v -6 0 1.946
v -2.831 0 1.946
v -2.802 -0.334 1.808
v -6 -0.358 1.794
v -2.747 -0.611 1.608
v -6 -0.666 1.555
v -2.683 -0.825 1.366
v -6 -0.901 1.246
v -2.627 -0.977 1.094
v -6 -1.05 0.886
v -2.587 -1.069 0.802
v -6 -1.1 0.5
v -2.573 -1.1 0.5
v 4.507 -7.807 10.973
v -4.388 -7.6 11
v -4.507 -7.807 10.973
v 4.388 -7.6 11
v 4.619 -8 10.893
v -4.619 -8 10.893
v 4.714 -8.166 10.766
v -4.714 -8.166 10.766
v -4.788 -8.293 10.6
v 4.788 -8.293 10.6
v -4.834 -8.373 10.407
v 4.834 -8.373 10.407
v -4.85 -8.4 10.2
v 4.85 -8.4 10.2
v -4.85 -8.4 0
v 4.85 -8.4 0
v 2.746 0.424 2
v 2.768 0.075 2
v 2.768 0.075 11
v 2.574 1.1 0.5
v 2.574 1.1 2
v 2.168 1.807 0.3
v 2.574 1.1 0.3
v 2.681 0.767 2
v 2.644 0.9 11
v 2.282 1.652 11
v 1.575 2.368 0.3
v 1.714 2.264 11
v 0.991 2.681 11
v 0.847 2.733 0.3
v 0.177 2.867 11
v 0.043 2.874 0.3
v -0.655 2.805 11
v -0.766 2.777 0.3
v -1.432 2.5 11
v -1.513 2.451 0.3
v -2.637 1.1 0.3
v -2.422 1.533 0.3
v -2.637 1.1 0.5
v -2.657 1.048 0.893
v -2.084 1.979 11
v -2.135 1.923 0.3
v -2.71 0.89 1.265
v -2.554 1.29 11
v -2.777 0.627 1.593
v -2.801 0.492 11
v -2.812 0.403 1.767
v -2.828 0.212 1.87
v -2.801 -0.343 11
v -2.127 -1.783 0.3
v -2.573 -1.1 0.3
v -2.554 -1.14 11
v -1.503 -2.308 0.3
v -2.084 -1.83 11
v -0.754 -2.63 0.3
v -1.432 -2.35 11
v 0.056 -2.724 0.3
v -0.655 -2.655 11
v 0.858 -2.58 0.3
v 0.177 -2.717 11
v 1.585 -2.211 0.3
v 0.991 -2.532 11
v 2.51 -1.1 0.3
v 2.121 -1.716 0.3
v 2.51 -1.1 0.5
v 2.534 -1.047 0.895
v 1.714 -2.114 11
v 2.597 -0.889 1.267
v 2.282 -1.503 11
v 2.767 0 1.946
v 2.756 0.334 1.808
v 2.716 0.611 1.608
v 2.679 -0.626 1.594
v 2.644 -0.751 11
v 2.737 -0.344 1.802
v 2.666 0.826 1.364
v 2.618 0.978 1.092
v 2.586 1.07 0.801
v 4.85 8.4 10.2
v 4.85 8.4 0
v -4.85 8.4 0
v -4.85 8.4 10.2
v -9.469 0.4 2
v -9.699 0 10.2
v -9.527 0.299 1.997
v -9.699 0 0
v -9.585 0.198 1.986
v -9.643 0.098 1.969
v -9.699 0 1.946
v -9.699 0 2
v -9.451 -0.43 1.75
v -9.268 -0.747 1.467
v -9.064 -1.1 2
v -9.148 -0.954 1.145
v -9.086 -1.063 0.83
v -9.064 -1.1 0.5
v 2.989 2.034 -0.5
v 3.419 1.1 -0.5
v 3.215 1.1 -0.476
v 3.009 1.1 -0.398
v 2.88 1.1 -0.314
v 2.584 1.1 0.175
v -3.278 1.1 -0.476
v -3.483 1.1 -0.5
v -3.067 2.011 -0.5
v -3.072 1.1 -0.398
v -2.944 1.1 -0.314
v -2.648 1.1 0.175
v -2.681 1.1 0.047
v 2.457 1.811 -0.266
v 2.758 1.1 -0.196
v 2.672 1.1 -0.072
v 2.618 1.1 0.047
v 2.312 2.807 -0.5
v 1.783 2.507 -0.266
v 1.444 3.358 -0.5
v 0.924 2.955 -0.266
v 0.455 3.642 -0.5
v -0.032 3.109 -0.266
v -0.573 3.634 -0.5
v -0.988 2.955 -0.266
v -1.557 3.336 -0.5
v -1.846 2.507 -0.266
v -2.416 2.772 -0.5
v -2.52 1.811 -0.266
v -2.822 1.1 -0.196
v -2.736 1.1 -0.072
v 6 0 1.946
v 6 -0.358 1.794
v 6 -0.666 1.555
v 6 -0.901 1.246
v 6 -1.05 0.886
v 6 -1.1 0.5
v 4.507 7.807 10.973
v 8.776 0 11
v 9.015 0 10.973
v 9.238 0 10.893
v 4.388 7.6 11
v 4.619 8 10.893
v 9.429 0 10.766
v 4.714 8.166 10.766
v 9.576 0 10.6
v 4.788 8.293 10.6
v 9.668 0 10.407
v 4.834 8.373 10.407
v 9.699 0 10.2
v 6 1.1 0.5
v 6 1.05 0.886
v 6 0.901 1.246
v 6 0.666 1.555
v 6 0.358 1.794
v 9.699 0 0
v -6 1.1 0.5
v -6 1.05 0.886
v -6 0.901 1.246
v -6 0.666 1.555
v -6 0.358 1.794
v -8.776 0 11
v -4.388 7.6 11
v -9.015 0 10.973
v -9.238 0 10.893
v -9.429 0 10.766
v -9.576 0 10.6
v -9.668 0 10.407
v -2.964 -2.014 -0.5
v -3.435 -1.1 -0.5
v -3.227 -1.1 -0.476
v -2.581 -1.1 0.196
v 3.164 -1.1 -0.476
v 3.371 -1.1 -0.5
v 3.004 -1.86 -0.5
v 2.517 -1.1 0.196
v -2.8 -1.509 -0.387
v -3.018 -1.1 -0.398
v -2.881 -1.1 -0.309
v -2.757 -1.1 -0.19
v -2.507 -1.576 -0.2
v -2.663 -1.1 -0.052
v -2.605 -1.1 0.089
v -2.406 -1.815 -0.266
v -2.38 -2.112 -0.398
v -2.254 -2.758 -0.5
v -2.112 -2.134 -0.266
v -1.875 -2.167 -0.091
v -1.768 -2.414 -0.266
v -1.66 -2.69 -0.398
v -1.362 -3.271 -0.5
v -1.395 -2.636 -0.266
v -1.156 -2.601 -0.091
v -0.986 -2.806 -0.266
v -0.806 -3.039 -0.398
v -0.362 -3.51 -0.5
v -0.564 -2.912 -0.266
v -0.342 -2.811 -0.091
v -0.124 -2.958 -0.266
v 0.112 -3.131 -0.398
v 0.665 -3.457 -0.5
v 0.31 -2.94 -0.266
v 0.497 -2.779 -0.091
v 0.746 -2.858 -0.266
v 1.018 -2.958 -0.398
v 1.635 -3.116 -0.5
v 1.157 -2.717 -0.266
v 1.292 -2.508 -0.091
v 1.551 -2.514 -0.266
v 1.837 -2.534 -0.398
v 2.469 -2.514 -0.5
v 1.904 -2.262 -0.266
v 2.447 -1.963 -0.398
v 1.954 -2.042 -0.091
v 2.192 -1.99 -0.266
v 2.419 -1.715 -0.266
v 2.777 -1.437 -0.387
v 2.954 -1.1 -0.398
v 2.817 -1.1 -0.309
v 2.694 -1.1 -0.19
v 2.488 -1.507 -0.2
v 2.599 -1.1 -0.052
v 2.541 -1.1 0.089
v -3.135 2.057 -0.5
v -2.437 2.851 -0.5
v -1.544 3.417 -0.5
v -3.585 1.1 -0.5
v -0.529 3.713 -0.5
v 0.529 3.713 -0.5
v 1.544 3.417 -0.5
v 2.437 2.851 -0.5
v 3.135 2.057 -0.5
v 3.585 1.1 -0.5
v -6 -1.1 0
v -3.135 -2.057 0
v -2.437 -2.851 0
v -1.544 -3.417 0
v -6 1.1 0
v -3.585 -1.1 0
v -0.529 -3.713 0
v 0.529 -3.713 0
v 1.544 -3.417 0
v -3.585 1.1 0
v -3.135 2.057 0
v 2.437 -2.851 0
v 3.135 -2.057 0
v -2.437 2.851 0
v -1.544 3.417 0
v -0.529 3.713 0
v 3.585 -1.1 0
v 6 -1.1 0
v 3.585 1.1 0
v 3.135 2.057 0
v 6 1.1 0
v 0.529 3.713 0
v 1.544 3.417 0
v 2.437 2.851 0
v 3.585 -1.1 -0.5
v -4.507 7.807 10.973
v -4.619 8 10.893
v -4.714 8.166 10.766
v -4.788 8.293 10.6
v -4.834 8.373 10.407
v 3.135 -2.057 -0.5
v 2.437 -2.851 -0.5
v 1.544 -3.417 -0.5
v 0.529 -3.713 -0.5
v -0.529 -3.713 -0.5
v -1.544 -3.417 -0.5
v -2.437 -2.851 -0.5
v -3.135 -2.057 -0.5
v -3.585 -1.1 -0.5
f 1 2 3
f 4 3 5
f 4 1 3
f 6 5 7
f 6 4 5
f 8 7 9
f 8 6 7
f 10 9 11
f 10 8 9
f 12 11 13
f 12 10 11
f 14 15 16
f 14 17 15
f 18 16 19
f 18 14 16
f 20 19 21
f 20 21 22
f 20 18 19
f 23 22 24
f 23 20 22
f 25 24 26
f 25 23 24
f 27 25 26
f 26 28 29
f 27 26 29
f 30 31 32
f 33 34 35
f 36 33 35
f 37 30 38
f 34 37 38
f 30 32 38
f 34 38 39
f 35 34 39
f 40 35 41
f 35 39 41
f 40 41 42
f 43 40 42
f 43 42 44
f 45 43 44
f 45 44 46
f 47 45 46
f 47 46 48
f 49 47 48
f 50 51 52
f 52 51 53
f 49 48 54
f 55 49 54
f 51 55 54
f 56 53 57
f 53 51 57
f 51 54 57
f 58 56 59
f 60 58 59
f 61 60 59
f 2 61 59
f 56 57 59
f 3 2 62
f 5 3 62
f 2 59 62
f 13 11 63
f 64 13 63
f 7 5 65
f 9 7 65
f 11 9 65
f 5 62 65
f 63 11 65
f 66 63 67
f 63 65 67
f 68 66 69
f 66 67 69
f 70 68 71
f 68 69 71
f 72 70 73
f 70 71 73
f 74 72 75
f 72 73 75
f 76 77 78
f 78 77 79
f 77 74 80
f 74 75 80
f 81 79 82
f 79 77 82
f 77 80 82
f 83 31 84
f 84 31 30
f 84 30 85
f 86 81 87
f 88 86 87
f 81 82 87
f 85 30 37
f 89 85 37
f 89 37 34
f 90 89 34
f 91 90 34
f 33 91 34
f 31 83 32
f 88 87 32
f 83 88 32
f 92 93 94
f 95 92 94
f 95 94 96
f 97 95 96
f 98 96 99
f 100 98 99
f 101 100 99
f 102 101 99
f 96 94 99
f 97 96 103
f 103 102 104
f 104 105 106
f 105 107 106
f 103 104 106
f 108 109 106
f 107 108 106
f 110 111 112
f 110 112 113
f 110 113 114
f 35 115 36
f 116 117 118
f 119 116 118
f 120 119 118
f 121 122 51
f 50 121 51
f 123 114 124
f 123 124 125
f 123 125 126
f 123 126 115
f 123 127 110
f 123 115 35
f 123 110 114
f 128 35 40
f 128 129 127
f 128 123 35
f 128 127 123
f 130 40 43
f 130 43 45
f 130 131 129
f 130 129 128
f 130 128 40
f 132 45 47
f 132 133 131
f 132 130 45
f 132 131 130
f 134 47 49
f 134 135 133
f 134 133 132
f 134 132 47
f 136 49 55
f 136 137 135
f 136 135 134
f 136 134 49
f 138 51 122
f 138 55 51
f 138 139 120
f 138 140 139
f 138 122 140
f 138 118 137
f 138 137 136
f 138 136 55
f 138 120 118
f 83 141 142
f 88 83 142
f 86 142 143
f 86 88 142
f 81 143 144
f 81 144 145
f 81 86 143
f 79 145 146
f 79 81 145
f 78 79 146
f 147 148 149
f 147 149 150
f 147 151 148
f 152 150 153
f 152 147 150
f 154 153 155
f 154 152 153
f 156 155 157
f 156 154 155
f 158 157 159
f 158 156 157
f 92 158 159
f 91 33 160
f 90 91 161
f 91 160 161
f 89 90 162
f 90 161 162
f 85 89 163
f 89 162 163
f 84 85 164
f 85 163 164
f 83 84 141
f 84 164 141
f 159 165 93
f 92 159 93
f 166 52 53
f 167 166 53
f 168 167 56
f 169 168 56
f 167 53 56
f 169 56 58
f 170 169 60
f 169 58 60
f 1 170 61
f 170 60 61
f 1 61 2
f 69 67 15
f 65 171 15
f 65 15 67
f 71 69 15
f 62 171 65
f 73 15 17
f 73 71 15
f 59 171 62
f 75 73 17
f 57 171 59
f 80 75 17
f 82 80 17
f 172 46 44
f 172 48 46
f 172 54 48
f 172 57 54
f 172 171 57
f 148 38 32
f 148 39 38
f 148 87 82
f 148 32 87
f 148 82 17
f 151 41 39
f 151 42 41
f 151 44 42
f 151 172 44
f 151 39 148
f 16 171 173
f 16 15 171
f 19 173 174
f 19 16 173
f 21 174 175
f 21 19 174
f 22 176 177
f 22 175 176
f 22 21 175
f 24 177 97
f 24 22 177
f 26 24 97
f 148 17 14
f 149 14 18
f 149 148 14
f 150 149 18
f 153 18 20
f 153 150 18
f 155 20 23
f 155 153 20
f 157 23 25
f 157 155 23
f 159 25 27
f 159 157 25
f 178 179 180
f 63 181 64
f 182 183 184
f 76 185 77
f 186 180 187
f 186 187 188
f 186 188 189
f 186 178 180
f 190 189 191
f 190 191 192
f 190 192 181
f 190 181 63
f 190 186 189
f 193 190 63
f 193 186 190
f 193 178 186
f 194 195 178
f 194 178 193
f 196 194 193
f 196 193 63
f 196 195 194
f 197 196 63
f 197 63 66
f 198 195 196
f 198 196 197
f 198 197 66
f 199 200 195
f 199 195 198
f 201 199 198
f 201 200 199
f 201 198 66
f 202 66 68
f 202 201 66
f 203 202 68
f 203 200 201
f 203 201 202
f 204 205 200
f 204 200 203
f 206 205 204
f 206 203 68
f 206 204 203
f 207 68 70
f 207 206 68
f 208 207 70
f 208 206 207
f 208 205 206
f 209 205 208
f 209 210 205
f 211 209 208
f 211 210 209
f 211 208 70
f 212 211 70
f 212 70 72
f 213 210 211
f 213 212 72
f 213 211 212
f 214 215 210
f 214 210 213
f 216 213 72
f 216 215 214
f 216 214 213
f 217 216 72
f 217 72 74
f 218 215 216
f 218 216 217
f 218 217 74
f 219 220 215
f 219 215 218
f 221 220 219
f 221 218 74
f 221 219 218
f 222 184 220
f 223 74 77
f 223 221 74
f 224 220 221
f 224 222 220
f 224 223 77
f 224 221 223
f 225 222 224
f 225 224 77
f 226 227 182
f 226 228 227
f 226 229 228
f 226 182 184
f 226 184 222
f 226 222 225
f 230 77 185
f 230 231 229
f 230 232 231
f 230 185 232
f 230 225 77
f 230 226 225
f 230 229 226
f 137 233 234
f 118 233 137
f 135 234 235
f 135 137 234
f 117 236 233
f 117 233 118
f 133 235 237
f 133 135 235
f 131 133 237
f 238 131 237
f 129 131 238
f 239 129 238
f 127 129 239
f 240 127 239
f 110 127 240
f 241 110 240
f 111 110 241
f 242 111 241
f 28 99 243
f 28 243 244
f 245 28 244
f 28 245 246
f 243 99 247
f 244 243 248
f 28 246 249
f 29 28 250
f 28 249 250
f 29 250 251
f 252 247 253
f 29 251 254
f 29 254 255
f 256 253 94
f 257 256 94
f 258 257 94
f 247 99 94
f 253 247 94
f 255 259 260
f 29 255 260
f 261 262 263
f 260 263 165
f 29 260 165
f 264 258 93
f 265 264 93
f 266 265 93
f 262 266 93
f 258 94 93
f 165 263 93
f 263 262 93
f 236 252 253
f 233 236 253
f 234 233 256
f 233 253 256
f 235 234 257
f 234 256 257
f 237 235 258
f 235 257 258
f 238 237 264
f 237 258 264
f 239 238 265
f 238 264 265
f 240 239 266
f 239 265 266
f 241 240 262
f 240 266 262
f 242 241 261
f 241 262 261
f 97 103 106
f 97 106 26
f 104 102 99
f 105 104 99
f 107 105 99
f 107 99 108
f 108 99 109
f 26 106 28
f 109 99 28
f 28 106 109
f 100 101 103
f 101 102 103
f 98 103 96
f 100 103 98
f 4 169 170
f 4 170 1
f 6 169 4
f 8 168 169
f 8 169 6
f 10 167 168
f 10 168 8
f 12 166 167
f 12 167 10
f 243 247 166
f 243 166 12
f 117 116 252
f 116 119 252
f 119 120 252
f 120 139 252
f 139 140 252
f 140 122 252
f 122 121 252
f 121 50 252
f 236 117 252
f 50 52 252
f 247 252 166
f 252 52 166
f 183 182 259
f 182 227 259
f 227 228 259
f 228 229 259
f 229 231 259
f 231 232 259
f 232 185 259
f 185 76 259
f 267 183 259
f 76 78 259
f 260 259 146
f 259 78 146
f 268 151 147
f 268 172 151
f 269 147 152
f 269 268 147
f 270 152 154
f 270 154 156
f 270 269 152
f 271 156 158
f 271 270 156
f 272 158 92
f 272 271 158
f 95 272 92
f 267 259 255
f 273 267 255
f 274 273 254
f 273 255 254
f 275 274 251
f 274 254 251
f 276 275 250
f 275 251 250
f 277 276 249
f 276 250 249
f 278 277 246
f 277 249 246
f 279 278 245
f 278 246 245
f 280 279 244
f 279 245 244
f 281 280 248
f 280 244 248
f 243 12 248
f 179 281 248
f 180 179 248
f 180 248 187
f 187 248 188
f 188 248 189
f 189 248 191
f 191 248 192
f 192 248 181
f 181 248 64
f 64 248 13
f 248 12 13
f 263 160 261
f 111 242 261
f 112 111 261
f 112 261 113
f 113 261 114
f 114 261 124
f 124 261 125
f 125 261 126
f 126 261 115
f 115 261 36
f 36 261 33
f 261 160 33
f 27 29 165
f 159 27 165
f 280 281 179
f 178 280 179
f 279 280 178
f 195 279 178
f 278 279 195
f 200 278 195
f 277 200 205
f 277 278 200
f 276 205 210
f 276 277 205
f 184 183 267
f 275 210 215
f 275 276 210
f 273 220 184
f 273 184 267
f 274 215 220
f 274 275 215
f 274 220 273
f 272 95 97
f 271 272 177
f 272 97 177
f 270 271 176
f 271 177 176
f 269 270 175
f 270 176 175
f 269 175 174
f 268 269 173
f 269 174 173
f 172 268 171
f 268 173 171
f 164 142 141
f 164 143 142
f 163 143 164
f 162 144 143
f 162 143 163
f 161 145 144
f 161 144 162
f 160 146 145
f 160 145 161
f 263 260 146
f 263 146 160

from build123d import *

# Parameters (mm, degrees)
F0_R         = 2.8
F1_DEPTH     = 11
F3_DEPTH     = 2
F5_DEPTH     = 0.5
F6_DEPTH     = 0.5
F7_R         = 0.8
F8_T4_DEPTH  = 7.176254213
F8_S5_R      = 2.8
F8_T6_DEPTH  = 5
F8_T10_DEPTH = 7.240123034
F8_S11_R     = 2.8
F8_T12_DEPTH = 5
F8_T16_DEPTH = 10.9265531961
F8_S17_R     = 2.8
F8_T18_DEPTH = 7
F8_T24_DEPTH = 10.862684375
F8_S25_R     = 2.8
F8_T26_DEPTH = 7
F9_R         = 0.8


# Not quite as in the source:
# - a fillet or chamfer that OpenCascade refuses, or shapes differently, is made with other operations: its cross-section is extruded or revolved along the edge and cut away or added


with BuildPart() as f1:
    # F0 (on Top) → F1 (new body)
    with BuildSketch(Plane.XY):
        Polygon((4.8497422612, -8.4), (9.6994845224, 0), (4.8497422612, 8.4), (-4.8497422612, 8.4), (-9.6994845224, 0), (-4.8497422612, -8.4), align=None)
        with Locations((-0.031784919, 0.0747148006)):
            Circle(F0_R, mode=Mode.SUBTRACT)
    extrude(amount=F1_DEPTH)

    # F2 (on Top) → F3 (cut)
    with BuildSketch(Plane.XY):
        with BuildLine():
            Line((-6, 1.1), (-6, -1.1))
            Line((-6, -1.1), (-3.585038354, -1.1))
            ThreePointArc((-3.585038354, -1.1), (-3.75, 0), (-3.585038354, 1.1))
            Line((-3.585038354, 1.1), (-6, 1.1))
        make_face()
        with BuildLine():
            ThreePointArc((-3.585038354, 1.1), (-3.75, 0), (-3.585038354, -1.1))
            Line((-3.585038354, -1.1), (3.585038354, -1.1))
            ThreePointArc((3.585038354, -1.1), (3.7085302903, -0.556150237), (3.75, 0))
            ThreePointArc((3.75, 0), (3.7085302903, 0.556150237), (3.585038354, 1.1))
            Line((3.585038354, 1.1), (-3.585038354, 1.1))
        make_face()
        with BuildLine():
            ThreePointArc((3.75, 0), (3.7085302903, -0.556150237), (3.585038354, -1.1))
            Line((3.585038354, -1.1), (6, -1.1))
            Line((6, -1.1), (6, 1.1))
            Line((6, 1.1), (3.585038354, 1.1))
            ThreePointArc((3.585038354, 1.1), (3.7085302903, 0.556150237), (3.75, 0))
        make_face()
    extrude(amount=F3_DEPTH, mode=Mode.SUBTRACT)

    # F4 (on face) → F5 (join)
    with BuildSketch(Plane(origin=(0, 0, 0), x_dir=(1, 0, 0), z_dir=(0, 0, -1))):
        with BuildLine():
            Line((2.509876966, 1.1), (3.585038354, 1.1))
            ThreePointArc((3.585038354, 1.1), (0, 3.75), (-3.585038354, 1.1))
            Line((-3.585038354, 1.1), (-2.5734468039, 1.1))
            ThreePointArc((-2.5734468039, 1.1), (-0.031784919, 2.7252851994), (2.509876966, 1.1))
        make_face()
    extrude(amount=F5_DEPTH)

    # F4 (on face) → F6 (join)
    with BuildSketch(Plane(origin=(0, 0, 0), x_dir=(1, 0, 0), z_dir=(0, 0, -1))):
        with BuildLine():
            ThreePointArc((-3.585038354, -1.1), (0, -3.75), (3.585038354, -1.1))
            Line((3.585038354, -1.1), (2.573745787, -1.1))
            ThreePointArc((2.573745787, -1.1), (-0.031784919, -2.8747148006), (-2.637315625, -1.1))
            Line((-2.637315625, -1.1), (-3.585038354, -1.1))
        make_face()
    extrude(amount=F6_DEPTH)

    # F7
    f7_edges = [f1.edges().sort_by_distance(p)[0] for p in [
        (-0.031785, 2.874715, -0.5),
        (-0.031785, -2.725285, -0.5),
    ]]
    fillet(f7_edges, radius=F7_R)

    # F8: fillet of radius 1.5 on 4 edges, made by hand


with BuildPart() as f8_tool2:
    # F8_s3 → F8_t4 (new body)
    with BuildSketch(Plane.YZ.offset(6)):
        with BuildLine():
            ThreePointArc((1.1, 0.5), (0.6606601718, 1.5606601718), (-0.4, 2))
            Line((-0.4, 2), (1.1, 2))
            Line((1.1, 2), (1.1, 0.5))
        make_face()
    extrude(amount=-F8_T4_DEPTH)

    # F8_s5 → F8_t6 (cut, symmetric)
    with BuildSketch(Plane.XY.offset(1.2)):
        with Locations((-0.031784919, 0.0747148006)):
            Circle(F8_S5_R)
    extrude(amount=F8_T6_DEPTH, both=True, mode=Mode.SUBTRACT)


with BuildPart() as f1_1:
    add(f1.part)

    # F8_t1: union F8_tool2
    add(f8_tool2.part)


with BuildPart() as f8_tool8:
    # F8_s9 → F8_t10 (new body)
    with BuildSketch(Plane.YZ.offset(-1.240123034)):
        with BuildLine():
            ThreePointArc((0.4, 2), (-0.6606601718, 1.5606601718), (-1.1, 0.5))
            Line((-1.1, 0.5), (-1.1, 2))
            Line((-1.1, 2), (0.4, 2))
        make_face()
    extrude(amount=F8_T10_DEPTH)

    # F8_s11 → F8_t12 (cut, symmetric)
    with BuildSketch(Plane.XY.offset(1.2)):
        with Locations((-0.031784919, 0.0747148006)):
            Circle(F8_S11_R)
    extrude(amount=F8_T12_DEPTH, both=True, mode=Mode.SUBTRACT)


with BuildPart() as f1_2:
    add(f1_1.part)

    # F8_t7: union F8_tool8
    add(f8_tool8.part)


with BuildPart() as f8_tool14:
    # F8_s15 → F8_t16 (new body)
    with BuildSketch(Plane.YZ.offset(-9.75)):
        with BuildLine():
            ThreePointArc((0.4, 2), (-0.6606601718, 1.5606601718), (-1.1, 0.5))
            Line((-1.1, 0.5), (-1.1, 2))
            Line((-1.1, 2), (0.4, 2))
        make_face()
    extrude(amount=F8_T16_DEPTH)

    # F8_s17 → F8_t18 (cut, symmetric)
    with BuildSketch(Plane.XY.offset(1.2)):
        with Locations((-0.031784919, 0.0747148006)):
            Circle(F8_S17_R)
    extrude(amount=F8_T18_DEPTH, both=True, mode=Mode.SUBTRACT)

    split(bisect_by=Plane(origin=(-7.2746133918, -4.2, 0), x_dir=(0, 0, 1), z_dir=(0.8660254038, 0.5, 0)), keep=Keep.TOP)

    split(bisect_by=Plane(origin=(-7.2746133918, 4.2, 0), x_dir=(0, 0, 1), z_dir=(0.8660254038, -0.5, 0)), keep=Keep.TOP)


with BuildPart() as f1_3:
    add(f1_2.part)

    # F8_t13: union F8_tool14
    add(f8_tool14.part)


with BuildPart() as f8_tool22:
    # F8_s23 → F8_t24 (new body)
    with BuildSketch(Plane.YZ.offset(1.112684375)):
        with BuildLine():
            ThreePointArc((1.1, 0.5), (0.6606601718, 1.5606601718), (-0.4, 2))
            Line((-0.4, 2), (1.1, 2))
            Line((1.1, 2), (1.1, 0.5))
        make_face()
    extrude(amount=-F8_T24_DEPTH)

    # F8_s25 → F8_t26 (cut, symmetric)
    with BuildSketch(Plane.XY.offset(1.2)):
        with Locations((-0.031784919, 0.0747148006)):
            Circle(F8_S25_R)
    extrude(amount=F8_T26_DEPTH, both=True, mode=Mode.SUBTRACT)

    split(bisect_by=Plane(origin=(-7.2746133918, -4.2, 0), x_dir=(0, 0, 1), z_dir=(0.8660254038, 0.5, 0)), keep=Keep.TOP)

    split(bisect_by=Plane(origin=(-7.2746133918, 4.2, 0), x_dir=(0, 0, 1), z_dir=(0.8660254038, -0.5, 0)), keep=Keep.TOP)


with BuildPart() as f1_4:
    add(f1_3.part)

    # F8_t21: union F8_tool22
    add(f8_tool22.part)

    # F9
    f9_edges = [f1_4.edges().sort_by_distance(p)[0] for p in [
        (0, -8.4, 11),
        (7.274613, -4.2, 11),
        (7.274613, 4.2, 11),
        (0, 8.4, 11),
        (-7.274613, 4.2, 11),
        (-7.274613, -4.2, 11),
    ]]
    fillet(f9_edges, radius=F9_R)


solid = f1_4.part
